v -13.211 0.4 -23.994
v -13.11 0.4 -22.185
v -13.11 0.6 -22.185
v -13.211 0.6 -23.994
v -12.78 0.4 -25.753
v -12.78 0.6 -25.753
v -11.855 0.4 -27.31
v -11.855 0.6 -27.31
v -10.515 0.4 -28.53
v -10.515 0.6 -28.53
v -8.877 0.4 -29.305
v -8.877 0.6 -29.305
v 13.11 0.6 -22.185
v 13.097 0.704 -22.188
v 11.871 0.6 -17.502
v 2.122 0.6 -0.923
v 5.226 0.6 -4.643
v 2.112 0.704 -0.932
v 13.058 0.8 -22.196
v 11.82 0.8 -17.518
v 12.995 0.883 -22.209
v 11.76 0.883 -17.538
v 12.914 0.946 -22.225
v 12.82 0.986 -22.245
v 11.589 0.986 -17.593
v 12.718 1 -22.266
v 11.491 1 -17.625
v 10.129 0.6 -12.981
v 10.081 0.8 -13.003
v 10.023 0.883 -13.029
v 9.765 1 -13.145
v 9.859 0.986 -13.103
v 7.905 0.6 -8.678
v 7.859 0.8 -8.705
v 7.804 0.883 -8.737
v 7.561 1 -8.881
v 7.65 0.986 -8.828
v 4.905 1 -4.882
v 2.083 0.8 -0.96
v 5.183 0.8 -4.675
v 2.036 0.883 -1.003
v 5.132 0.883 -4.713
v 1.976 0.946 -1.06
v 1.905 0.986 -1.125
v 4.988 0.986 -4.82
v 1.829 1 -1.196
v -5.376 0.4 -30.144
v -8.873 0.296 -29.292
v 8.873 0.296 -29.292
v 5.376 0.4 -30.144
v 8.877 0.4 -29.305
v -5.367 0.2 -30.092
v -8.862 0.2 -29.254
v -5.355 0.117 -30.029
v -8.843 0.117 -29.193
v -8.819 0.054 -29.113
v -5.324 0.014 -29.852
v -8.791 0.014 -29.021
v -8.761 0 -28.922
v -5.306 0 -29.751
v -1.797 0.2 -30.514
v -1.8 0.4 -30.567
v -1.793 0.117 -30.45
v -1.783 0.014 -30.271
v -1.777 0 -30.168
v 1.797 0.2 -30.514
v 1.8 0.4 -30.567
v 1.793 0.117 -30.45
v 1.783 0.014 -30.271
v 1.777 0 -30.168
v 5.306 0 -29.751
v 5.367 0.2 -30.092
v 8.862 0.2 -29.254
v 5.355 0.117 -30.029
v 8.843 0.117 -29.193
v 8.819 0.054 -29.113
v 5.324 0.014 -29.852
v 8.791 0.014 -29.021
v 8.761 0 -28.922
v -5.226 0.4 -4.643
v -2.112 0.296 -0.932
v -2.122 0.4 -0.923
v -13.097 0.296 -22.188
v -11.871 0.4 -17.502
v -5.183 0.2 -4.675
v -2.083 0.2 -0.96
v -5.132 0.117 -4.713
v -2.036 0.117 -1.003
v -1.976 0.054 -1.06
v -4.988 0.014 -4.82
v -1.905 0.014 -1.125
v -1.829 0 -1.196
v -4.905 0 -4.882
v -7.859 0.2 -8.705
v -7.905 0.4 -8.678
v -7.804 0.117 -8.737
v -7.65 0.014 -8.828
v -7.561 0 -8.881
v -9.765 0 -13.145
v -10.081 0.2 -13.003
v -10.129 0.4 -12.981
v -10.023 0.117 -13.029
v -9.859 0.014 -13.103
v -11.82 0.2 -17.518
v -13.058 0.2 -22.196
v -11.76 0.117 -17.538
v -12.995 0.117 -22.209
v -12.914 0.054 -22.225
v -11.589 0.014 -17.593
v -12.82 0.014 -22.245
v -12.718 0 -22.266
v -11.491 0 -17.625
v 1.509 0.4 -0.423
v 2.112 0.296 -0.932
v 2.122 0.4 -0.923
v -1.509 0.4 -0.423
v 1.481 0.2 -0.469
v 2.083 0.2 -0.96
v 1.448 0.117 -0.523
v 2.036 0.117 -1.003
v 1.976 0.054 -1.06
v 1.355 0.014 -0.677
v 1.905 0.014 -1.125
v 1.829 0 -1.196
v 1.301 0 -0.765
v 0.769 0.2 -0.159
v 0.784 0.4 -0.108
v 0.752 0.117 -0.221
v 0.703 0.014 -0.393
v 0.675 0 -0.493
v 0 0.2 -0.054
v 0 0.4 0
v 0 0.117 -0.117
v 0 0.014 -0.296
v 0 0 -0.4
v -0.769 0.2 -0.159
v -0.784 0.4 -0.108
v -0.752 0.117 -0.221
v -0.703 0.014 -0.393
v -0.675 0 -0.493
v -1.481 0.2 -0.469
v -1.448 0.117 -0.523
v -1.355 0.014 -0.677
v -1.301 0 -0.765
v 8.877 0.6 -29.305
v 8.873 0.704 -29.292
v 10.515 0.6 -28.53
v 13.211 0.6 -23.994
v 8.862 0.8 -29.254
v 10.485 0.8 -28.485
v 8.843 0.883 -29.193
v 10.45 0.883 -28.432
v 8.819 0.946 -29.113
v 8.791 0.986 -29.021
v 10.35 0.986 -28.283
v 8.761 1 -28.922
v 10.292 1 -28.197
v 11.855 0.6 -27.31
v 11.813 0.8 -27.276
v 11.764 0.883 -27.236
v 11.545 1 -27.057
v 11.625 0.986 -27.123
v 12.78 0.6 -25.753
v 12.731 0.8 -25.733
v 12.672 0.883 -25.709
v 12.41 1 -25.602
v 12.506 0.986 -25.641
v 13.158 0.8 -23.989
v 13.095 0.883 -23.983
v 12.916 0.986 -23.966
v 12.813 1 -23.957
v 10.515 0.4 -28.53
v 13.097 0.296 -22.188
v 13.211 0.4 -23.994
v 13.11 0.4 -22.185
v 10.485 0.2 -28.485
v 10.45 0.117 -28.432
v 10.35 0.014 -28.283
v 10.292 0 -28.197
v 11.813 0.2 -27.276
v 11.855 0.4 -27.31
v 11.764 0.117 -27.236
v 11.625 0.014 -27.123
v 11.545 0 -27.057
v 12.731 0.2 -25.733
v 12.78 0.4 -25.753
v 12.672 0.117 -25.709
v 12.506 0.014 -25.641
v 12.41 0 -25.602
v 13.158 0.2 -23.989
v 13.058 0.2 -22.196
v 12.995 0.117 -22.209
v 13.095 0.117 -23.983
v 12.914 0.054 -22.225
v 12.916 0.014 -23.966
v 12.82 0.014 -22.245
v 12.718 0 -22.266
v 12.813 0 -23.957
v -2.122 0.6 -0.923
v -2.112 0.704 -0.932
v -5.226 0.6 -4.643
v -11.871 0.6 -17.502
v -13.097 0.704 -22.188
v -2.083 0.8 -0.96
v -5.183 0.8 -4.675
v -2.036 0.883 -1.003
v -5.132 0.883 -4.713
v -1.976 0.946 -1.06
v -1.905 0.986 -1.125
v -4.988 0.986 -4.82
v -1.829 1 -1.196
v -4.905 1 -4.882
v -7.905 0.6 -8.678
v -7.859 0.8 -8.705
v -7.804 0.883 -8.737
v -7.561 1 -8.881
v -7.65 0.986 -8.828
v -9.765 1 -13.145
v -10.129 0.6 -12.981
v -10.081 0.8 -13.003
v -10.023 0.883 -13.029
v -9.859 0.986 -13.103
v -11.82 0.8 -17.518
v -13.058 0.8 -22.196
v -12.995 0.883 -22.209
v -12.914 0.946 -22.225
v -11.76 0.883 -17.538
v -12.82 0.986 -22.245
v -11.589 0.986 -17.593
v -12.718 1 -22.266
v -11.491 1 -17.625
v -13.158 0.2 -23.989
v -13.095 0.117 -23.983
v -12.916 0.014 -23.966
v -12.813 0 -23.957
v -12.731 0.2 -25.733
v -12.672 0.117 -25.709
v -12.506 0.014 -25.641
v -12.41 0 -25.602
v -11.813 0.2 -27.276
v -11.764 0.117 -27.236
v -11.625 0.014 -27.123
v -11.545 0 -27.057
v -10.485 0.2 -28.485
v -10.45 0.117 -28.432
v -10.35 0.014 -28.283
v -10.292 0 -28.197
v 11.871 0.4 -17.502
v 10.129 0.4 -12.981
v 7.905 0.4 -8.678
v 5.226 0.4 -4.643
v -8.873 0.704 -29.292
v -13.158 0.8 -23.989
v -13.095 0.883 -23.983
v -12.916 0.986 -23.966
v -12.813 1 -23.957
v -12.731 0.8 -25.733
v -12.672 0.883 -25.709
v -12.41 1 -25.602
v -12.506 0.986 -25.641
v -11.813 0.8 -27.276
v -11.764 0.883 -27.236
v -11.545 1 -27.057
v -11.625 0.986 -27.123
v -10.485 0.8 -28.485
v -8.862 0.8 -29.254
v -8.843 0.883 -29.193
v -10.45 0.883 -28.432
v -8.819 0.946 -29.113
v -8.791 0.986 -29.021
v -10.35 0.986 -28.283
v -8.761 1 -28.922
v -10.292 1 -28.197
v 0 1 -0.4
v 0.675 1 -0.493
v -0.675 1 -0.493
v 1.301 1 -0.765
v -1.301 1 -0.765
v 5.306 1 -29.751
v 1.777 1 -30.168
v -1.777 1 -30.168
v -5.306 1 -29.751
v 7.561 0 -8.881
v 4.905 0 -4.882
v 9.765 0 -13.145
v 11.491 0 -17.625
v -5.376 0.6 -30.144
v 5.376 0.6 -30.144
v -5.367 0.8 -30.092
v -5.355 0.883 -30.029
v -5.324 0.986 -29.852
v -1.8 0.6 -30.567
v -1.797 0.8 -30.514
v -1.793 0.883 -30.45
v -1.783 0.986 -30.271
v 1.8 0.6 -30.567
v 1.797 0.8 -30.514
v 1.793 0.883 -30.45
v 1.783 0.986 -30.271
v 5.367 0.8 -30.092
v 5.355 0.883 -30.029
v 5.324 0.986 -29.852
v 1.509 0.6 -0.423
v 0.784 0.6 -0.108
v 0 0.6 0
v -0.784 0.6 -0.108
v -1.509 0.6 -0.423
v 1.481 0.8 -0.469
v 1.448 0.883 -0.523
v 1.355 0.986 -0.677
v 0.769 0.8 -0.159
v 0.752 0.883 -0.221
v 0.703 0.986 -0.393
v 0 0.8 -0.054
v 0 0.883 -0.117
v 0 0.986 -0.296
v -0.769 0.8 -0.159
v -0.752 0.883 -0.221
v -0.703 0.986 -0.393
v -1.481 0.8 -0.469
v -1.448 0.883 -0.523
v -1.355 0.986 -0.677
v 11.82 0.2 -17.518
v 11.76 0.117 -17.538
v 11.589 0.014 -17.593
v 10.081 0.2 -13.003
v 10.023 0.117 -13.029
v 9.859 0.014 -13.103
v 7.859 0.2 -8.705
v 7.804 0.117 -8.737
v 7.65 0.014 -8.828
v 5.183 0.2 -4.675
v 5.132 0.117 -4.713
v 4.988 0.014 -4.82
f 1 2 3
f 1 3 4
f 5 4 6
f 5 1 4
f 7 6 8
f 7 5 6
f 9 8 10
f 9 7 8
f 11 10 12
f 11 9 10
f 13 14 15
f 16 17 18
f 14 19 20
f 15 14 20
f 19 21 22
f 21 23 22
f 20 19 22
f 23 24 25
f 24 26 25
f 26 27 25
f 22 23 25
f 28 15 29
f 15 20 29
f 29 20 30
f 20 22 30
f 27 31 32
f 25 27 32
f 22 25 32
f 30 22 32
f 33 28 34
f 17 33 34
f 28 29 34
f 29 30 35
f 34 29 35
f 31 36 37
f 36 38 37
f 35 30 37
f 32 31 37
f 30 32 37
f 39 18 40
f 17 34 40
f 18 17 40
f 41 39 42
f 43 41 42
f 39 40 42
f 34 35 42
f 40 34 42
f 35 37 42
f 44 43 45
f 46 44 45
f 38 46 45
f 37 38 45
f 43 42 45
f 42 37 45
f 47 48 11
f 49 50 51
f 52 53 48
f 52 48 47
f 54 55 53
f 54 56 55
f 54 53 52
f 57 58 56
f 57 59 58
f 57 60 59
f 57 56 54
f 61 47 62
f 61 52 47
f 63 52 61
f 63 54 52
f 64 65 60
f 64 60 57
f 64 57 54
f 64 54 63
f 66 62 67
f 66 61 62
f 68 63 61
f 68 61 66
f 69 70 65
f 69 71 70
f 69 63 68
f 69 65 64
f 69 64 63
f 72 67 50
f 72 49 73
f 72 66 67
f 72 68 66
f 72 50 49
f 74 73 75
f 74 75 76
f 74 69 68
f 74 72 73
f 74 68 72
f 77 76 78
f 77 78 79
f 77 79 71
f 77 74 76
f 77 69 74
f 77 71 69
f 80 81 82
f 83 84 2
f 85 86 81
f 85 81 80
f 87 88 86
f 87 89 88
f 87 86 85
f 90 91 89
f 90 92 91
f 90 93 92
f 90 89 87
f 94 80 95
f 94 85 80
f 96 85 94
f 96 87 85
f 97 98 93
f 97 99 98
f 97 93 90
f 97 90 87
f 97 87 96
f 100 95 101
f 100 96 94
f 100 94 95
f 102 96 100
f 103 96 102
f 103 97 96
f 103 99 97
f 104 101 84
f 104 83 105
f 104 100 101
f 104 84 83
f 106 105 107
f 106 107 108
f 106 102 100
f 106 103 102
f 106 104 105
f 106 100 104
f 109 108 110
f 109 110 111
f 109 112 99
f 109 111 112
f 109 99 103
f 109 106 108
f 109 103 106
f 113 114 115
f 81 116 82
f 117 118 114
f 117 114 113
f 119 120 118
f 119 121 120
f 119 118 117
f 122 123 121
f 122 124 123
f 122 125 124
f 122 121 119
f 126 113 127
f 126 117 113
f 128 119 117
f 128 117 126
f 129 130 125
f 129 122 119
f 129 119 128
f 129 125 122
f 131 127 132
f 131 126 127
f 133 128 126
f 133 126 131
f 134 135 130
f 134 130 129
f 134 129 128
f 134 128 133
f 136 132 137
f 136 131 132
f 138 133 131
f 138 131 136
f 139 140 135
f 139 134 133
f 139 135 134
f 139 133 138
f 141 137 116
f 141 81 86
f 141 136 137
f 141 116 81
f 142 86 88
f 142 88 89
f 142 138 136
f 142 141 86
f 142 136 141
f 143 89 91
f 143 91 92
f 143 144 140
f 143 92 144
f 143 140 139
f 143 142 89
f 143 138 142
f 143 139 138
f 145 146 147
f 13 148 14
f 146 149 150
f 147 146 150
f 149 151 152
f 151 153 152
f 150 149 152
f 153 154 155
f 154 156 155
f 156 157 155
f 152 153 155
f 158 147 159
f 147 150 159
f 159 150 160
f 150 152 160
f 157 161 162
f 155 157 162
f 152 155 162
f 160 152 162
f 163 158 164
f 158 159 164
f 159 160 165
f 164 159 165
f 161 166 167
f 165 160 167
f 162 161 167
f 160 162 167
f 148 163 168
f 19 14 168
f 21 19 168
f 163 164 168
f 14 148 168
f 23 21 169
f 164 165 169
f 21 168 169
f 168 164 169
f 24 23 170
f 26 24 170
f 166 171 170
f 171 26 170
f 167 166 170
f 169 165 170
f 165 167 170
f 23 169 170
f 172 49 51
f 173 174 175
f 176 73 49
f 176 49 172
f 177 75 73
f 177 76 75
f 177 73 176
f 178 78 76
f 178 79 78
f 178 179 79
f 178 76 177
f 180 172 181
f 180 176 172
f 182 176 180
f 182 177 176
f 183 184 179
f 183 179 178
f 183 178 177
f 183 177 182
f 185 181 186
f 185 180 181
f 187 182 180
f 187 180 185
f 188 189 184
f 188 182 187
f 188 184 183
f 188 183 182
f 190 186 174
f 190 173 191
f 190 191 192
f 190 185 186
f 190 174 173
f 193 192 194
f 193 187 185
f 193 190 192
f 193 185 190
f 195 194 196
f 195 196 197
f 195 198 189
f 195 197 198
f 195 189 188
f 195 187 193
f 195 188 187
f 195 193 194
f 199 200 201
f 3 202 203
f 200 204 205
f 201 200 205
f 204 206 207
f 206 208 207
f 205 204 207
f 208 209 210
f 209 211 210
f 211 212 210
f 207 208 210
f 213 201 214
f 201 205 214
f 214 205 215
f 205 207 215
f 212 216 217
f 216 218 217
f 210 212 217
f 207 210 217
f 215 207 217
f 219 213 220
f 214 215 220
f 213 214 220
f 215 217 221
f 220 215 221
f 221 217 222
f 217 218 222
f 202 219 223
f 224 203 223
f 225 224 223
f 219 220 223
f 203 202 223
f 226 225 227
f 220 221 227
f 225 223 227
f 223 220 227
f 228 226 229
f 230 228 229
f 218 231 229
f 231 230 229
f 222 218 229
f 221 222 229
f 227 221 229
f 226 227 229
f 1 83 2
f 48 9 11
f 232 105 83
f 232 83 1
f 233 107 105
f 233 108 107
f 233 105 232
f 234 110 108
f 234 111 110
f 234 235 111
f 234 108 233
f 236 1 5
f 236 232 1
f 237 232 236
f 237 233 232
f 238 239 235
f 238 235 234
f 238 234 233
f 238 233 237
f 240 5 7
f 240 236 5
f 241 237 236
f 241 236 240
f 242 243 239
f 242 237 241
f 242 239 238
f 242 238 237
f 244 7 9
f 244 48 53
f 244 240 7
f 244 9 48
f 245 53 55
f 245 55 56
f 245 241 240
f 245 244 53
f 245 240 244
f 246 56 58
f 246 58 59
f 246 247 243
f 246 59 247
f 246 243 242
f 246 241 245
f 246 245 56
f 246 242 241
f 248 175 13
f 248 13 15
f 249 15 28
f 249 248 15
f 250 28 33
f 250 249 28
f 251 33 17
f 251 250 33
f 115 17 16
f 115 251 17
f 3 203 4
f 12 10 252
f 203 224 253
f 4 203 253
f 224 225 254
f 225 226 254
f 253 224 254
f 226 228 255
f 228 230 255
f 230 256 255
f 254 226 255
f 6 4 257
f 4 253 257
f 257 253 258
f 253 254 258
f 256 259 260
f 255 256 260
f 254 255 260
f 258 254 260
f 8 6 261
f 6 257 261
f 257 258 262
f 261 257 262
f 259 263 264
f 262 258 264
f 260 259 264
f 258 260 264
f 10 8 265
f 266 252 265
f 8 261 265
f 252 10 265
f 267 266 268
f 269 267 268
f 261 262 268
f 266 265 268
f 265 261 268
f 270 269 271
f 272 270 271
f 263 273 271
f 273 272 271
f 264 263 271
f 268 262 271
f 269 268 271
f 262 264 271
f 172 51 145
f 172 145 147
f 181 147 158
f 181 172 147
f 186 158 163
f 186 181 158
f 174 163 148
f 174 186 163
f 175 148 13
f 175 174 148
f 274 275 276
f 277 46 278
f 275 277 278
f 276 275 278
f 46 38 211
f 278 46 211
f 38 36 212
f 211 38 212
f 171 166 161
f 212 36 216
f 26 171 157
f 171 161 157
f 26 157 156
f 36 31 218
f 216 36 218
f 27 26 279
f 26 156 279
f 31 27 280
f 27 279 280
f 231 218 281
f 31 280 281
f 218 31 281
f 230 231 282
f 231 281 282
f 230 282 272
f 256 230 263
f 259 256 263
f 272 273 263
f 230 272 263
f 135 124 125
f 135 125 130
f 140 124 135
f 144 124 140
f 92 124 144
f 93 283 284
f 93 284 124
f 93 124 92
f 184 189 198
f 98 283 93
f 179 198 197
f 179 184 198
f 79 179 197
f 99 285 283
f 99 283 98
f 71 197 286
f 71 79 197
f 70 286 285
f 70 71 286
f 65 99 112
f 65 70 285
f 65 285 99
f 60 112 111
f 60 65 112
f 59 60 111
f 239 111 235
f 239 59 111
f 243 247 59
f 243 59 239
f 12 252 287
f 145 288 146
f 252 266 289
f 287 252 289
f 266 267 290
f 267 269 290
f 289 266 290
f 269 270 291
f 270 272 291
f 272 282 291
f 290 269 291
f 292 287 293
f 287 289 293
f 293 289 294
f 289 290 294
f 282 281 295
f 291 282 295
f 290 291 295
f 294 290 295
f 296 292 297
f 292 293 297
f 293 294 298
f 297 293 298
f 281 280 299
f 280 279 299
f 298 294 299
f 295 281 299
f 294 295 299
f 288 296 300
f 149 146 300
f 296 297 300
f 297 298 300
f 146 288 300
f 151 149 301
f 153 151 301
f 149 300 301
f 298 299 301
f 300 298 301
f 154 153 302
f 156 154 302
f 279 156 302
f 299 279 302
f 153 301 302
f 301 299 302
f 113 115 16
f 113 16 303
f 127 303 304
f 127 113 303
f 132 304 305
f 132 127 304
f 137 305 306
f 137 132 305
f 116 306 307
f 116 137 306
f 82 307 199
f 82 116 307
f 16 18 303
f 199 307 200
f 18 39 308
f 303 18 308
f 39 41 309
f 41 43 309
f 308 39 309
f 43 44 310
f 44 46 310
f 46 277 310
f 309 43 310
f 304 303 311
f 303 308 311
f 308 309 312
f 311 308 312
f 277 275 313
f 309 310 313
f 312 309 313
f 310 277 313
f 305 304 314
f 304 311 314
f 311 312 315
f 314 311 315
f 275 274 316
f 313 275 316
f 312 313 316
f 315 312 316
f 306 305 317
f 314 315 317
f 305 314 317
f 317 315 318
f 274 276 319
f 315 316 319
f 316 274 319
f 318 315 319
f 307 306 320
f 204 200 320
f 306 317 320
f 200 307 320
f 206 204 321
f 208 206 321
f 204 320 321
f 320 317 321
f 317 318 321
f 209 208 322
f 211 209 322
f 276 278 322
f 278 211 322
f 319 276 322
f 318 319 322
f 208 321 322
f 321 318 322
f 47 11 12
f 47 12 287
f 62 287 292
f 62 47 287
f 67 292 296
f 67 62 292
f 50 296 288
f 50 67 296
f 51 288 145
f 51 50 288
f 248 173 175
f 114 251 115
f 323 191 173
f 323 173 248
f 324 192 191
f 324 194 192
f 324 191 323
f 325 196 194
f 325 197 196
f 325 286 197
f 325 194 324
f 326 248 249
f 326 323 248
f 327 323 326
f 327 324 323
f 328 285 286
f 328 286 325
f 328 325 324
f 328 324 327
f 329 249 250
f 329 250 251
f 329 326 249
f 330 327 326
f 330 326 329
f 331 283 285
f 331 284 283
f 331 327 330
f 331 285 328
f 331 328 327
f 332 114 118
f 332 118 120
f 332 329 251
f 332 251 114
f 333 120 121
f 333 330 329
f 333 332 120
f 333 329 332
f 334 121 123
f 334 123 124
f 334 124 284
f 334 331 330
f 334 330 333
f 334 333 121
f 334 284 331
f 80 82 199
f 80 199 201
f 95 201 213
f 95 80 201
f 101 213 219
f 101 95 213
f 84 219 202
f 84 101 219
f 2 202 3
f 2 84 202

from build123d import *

# Parameters (mm, degrees)
BOSS_EXTRUDE1_DEPTH = 1
FILLET1_R           = 0.4


with BuildPart() as part:
    # Sketch1 → Boss-Extrude1 (new body)
    with BuildSketch(Plane(origin=(0, 0, 0), x_dir=(1, 0, 0), z_dir=(0, 1, 0))):
        with BuildLine():
            ThreePointArc((-8.877423872, 29.304875795), (0, 30.62), (8.877423872, 29.304875795))
            ThreePointArc((8.877423872, 29.304875795), (12.375173273, 26.566048159), (13.11, 22.184786084))
            ThreePointArc((13.11, 22.184786084), (9.076207285, 10.799312083), (2.121856975, 0.92320386))
            ThreePointArc((2.121856975, 0.92320386), (0, 0), (-2.121856975, 0.92320386))
            ThreePointArc((-2.121856975, 0.92320386), (-9.076207285, 10.799312083), (-13.11, 22.184786084))
            ThreePointArc((-13.11, 22.184786084), (-12.375173273, 26.566048159), (-8.877423872, 29.304875795))
        make_face()
    extrude(amount=BOSS_EXTRUDE1_DEPTH)

    # Fillet1
    fillet1_edges = [part.edges().sort_by_distance(p)[0] for p in [
        (0, 1, 0),
        (9.076207285, 1, -10.799312083),
        (12.375173273, 1, -26.566048159),
        (0, 1, -30.62),
        (-12.375173273, 1, -26.566048159),
        (0, 0, -30.62),
        (12.375173273, 0, -26.566048159),
        (9.076207285, 0, -10.799312083),
        (0, 0, 0),
        (-9.076207285, 0, -10.799312083),
        (-12.375173273, 0, -26.566048159),
        (-9.076207285, 1, -10.799312083),
    ]]
    fillet(fillet1_edges, radius=FILLET1_R)


solid = part.part
